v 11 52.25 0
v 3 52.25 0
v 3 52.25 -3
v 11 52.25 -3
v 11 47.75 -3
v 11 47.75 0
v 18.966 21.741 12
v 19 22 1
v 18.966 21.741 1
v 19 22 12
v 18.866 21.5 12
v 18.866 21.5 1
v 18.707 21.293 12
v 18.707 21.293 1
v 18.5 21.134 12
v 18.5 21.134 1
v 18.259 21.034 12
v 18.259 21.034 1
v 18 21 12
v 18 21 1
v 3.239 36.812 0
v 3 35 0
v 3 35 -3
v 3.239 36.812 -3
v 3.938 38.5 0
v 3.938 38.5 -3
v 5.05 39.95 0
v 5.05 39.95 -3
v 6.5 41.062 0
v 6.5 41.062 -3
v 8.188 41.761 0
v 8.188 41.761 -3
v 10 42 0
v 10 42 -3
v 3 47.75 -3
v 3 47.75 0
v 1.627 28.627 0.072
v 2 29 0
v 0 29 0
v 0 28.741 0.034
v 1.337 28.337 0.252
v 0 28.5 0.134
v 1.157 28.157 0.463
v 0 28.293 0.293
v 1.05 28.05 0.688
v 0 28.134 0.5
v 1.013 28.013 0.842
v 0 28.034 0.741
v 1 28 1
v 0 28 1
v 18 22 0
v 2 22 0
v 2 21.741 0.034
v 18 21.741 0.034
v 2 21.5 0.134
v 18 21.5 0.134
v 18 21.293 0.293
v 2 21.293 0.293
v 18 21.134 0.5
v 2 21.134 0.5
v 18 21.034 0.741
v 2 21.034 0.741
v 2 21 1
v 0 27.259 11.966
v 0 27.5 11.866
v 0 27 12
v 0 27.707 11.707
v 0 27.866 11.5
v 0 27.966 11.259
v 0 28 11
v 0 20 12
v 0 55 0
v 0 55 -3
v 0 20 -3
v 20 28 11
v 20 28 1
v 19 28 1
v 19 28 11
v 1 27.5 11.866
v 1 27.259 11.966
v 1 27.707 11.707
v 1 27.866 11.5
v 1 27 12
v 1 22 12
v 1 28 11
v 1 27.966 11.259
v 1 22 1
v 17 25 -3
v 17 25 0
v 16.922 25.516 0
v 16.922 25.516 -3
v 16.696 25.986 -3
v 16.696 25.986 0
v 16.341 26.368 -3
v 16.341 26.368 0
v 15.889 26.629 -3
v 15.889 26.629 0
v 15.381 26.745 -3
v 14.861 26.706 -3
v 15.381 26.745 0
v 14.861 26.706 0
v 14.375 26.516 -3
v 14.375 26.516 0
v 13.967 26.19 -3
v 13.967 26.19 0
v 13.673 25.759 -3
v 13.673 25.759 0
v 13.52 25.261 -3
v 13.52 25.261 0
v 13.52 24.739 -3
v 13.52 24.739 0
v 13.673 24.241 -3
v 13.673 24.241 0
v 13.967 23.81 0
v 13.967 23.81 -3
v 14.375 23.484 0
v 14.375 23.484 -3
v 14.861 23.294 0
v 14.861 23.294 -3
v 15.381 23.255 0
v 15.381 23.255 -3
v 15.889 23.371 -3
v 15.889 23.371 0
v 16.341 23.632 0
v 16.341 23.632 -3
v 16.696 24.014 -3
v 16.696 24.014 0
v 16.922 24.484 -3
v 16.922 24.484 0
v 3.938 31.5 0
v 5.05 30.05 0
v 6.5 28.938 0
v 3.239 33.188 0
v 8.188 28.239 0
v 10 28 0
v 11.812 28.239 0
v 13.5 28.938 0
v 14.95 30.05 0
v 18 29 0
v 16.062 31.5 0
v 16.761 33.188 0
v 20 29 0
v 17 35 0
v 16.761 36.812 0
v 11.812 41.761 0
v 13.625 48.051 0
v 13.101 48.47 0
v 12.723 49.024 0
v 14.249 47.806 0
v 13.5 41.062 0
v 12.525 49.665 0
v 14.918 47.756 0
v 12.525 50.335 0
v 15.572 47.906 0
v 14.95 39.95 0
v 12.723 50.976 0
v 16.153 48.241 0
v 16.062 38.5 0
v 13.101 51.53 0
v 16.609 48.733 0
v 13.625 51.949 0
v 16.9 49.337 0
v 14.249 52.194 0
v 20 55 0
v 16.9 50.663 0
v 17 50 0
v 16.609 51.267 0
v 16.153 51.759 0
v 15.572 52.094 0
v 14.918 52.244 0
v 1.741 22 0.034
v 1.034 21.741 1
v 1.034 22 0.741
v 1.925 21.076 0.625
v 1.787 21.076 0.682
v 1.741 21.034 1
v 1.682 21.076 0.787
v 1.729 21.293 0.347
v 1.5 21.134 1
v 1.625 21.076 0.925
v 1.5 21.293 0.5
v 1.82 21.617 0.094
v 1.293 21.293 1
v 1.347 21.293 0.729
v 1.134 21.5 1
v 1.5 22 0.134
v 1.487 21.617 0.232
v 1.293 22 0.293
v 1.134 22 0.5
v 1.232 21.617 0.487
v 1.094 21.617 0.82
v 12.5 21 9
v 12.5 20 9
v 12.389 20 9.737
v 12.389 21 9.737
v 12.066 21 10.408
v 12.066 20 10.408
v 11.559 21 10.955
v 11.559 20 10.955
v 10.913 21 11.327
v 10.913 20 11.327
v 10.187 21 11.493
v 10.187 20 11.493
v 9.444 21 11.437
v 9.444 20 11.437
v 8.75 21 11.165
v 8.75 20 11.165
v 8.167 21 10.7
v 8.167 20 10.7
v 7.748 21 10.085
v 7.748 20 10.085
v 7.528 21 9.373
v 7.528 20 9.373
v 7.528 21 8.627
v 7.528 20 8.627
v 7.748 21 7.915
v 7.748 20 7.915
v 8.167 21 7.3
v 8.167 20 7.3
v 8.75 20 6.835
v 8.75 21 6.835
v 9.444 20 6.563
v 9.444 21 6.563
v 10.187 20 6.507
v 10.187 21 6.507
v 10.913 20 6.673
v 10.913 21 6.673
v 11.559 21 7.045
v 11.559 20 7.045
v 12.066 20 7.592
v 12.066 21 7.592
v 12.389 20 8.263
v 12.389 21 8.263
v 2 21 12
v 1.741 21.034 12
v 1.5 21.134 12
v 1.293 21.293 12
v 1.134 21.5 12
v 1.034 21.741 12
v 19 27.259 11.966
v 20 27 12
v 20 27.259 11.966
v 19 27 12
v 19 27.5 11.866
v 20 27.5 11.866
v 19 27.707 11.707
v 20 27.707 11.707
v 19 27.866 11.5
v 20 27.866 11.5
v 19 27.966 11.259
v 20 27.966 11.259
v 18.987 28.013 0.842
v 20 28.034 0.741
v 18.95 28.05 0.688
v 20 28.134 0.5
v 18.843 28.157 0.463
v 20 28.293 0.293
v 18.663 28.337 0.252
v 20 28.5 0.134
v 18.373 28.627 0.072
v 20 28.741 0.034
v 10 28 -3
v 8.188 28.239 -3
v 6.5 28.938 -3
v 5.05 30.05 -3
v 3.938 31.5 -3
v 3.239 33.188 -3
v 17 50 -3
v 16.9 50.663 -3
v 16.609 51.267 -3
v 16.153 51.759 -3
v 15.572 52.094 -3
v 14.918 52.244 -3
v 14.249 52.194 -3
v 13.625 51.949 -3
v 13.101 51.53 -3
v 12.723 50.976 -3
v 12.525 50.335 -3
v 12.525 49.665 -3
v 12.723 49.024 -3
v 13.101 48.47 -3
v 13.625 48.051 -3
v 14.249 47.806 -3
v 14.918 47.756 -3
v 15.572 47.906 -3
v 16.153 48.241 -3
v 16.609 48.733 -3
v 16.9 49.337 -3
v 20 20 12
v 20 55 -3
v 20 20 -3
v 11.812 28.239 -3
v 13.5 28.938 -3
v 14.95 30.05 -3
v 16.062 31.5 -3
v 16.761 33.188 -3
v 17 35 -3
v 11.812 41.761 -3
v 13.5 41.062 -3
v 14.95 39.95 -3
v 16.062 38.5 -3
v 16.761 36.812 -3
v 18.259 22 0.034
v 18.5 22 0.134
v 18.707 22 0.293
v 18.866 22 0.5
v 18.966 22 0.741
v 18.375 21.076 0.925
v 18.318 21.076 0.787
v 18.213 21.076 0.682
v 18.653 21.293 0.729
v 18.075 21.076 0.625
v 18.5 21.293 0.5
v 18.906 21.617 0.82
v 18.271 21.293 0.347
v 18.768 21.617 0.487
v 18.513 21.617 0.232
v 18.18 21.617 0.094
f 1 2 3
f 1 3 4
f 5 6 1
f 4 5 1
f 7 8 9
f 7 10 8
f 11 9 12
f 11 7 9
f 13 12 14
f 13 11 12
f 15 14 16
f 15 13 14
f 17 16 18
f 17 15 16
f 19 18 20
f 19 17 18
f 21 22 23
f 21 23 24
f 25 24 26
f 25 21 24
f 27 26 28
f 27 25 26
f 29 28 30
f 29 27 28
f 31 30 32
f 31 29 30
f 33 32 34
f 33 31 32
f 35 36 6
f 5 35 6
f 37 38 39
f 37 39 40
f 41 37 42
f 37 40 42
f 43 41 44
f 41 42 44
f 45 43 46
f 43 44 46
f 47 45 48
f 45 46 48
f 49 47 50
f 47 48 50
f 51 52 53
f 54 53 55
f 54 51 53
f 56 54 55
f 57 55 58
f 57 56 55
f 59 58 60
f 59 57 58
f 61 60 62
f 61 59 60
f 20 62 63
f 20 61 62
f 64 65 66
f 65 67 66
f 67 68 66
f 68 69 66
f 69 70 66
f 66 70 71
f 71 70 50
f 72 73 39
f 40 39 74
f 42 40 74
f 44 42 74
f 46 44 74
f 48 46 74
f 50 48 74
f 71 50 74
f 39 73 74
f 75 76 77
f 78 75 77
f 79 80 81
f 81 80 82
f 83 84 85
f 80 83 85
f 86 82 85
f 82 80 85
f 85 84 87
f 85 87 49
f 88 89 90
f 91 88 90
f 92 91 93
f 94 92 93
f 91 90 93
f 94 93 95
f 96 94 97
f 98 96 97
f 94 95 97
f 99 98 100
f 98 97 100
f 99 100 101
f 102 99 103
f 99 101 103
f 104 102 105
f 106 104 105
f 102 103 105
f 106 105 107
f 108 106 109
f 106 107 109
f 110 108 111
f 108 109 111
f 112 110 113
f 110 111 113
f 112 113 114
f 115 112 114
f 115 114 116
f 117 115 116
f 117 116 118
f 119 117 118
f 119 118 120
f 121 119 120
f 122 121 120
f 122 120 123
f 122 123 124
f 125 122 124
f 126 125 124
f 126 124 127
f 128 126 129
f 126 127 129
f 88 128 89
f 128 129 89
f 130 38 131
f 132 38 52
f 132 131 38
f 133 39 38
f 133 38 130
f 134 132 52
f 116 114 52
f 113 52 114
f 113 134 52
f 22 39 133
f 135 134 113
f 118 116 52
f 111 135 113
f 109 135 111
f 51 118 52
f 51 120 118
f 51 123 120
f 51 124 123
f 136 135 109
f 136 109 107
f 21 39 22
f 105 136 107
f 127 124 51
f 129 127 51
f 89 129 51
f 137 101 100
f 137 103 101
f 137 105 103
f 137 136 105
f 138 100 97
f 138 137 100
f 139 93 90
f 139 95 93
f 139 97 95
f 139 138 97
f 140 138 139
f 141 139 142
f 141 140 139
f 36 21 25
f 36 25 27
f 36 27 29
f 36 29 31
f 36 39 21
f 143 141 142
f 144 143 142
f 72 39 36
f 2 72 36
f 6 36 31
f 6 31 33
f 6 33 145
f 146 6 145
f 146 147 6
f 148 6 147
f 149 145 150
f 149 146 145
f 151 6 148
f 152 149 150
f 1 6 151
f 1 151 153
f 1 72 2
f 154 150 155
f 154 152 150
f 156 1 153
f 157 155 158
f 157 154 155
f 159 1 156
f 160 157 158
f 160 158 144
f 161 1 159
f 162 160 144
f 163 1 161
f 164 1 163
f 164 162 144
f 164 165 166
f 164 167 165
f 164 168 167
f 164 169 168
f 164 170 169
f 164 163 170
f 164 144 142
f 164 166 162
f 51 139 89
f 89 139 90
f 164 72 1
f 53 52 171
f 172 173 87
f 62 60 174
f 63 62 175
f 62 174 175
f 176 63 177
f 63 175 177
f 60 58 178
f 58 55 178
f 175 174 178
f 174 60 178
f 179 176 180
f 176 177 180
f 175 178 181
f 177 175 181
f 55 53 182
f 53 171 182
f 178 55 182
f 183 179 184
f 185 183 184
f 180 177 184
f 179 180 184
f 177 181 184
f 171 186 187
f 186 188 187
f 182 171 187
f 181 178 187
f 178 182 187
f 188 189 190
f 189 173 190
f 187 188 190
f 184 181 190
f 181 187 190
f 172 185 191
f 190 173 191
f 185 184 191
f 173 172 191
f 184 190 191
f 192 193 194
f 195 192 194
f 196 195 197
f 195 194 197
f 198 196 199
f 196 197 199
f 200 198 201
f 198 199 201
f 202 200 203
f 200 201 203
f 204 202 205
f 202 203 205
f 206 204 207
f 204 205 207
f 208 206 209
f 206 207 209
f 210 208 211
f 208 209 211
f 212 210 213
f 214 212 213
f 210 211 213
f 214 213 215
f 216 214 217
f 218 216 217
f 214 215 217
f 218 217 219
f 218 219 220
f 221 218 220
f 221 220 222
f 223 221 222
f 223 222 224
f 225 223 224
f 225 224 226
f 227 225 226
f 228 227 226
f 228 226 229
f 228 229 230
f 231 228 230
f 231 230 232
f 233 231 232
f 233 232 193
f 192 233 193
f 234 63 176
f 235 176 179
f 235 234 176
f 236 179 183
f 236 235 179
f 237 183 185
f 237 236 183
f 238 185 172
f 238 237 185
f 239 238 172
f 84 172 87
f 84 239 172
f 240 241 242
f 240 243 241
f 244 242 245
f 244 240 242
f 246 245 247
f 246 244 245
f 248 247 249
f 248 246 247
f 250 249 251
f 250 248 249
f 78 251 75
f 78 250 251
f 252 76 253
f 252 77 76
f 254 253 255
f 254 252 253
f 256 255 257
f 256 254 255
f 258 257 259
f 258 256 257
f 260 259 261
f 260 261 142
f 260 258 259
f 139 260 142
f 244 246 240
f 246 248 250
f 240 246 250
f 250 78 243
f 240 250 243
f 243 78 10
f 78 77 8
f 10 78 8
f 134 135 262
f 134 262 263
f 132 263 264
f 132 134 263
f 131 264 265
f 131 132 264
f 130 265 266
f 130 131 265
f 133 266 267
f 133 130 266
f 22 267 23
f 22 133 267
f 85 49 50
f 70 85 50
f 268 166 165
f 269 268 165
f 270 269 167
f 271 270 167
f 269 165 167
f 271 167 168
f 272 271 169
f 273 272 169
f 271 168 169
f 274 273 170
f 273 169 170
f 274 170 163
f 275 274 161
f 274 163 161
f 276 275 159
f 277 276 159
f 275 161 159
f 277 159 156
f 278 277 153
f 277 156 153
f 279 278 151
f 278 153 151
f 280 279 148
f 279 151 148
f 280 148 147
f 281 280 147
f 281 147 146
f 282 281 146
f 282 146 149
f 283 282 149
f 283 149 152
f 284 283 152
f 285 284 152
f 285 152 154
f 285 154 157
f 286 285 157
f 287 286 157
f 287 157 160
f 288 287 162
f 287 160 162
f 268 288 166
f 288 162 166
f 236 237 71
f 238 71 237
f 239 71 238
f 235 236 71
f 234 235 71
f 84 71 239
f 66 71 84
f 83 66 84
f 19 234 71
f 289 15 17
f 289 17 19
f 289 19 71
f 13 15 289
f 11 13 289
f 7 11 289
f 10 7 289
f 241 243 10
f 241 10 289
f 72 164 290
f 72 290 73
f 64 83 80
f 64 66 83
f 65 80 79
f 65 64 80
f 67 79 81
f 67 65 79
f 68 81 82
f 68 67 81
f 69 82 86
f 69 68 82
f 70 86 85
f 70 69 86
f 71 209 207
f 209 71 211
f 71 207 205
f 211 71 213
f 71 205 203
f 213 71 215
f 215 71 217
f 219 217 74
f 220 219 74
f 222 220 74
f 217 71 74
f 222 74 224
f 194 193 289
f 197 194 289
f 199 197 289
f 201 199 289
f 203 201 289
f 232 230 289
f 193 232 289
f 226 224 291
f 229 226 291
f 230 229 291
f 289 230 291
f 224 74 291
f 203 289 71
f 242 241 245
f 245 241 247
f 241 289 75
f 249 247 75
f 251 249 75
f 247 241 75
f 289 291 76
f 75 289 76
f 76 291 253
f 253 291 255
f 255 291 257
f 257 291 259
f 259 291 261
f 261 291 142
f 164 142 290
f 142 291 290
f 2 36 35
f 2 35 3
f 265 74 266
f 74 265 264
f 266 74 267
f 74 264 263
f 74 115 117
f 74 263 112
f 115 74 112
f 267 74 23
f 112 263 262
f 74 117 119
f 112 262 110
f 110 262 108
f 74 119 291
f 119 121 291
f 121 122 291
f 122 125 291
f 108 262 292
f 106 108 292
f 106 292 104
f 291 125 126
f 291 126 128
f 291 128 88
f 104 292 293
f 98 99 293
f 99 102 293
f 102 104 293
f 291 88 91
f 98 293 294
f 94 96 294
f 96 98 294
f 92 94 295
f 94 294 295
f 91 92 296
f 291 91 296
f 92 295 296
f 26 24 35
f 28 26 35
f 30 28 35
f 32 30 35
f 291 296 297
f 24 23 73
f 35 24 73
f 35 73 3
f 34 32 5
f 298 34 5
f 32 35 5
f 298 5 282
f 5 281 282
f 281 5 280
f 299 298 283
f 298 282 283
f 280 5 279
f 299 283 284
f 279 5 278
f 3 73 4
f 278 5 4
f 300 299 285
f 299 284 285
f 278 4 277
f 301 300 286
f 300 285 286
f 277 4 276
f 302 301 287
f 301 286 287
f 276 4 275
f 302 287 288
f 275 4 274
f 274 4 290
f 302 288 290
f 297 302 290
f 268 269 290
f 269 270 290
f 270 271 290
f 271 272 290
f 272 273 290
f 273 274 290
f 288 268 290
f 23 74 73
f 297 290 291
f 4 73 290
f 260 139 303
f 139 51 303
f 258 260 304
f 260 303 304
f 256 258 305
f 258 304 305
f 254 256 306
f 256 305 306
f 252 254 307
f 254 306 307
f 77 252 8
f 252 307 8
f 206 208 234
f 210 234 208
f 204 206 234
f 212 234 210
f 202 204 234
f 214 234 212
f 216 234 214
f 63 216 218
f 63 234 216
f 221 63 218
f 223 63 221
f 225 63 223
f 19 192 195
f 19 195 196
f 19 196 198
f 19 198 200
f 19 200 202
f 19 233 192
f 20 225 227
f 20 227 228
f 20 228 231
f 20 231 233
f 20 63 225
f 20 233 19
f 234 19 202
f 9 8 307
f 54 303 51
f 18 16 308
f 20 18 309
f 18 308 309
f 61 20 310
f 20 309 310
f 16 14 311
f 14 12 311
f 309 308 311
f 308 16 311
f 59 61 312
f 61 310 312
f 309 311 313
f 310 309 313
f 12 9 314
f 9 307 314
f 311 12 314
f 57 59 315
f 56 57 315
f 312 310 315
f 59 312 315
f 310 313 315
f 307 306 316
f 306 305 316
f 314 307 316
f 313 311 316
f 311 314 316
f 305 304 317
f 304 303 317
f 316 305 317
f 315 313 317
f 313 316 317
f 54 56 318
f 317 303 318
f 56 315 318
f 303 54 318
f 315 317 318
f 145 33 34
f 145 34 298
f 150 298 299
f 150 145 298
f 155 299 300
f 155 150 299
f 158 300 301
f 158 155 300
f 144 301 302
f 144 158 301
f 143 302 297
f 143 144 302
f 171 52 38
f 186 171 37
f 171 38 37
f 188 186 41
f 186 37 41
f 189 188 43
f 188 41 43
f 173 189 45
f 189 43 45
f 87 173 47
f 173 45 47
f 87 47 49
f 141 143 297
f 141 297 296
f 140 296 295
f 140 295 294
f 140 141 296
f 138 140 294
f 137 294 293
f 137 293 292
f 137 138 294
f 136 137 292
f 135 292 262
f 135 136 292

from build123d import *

# Parameters (mm, degrees)
SKETCH1_7_W         = 20
SKETCH1_7_H         = 35
SKETCH1_7_R         = 2.25
SKETCH1_7_W_2       = 8
SKETCH1_7_H_2       = 4.5
SKETCH1_7_R_2       = 1.75
SKETCH1_7_R_3       = 7
BOSS_EXTRUDE2_DEPTH = 3
BOSS_EXTRUDE3_DEPTH = 12
SKETCH2_R           = 2.5
CUT_EXTRUDE1_DEPTH  = 43.05948169
FILLET1_R           = 1


with BuildPart() as part:
    # Sketch1<7> → Boss-Extrude2 (new body)
    with BuildSketch(Plane.XY):
        with Locations((10, 37.5)):
            Rectangle(SKETCH1_7_W, SKETCH1_7_H)
        with Locations((14.75, 50)):
            Circle(SKETCH1_7_R, mode=Mode.SUBTRACT)
        with Locations((7, 50)):
            Rectangle(SKETCH1_7_W_2, SKETCH1_7_H_2, mode=Mode.SUBTRACT)
        with Locations((15.25, 25)):
            Circle(SKETCH1_7_R_2, mode=Mode.SUBTRACT)
        with Locations((10, 35)):
            Circle(SKETCH1_7_R_3, mode=Mode.SUBTRACT)
    extrude(amount=-BOSS_EXTRUDE2_DEPTH)

    # Sketch1<8> → Boss-Extrude3 (add)
    with BuildSketch(Plane.XY):
        Polygon((0, 28), (0, 20), (20, 20), (20, 28), (19, 28), (19, 21), (1, 21), (1, 28), align=None)
    extrude(amount=BOSS_EXTRUDE3_DEPTH)

    # Sketch2 → Cut-Extrude1 (cut, through all)
    with BuildSketch(Plane.XZ.offset(-20)):
        with Locations((10, 9)):
            Circle(SKETCH2_R)
    extrude(amount=-CUT_EXTRUDE1_DEPTH, mode=Mode.SUBTRACT)

    # Fillet1
    fillet1_edges = [part.edges().sort_by_distance(p)[0] for p in [
        (19.5, 28, 12),
        (0.5, 28, 12),
        (1, 24.5, 0),
        (19, 24.5, 0),
        (19, 21, 6),
        (10, 21, 0),
        (1, 21, 6),
        (19.5, 28, 0),
        (0.5, 28, 0),
    ]]
    fillet(fillet1_edges, radius=FILLET1_R)


solid = part.part
